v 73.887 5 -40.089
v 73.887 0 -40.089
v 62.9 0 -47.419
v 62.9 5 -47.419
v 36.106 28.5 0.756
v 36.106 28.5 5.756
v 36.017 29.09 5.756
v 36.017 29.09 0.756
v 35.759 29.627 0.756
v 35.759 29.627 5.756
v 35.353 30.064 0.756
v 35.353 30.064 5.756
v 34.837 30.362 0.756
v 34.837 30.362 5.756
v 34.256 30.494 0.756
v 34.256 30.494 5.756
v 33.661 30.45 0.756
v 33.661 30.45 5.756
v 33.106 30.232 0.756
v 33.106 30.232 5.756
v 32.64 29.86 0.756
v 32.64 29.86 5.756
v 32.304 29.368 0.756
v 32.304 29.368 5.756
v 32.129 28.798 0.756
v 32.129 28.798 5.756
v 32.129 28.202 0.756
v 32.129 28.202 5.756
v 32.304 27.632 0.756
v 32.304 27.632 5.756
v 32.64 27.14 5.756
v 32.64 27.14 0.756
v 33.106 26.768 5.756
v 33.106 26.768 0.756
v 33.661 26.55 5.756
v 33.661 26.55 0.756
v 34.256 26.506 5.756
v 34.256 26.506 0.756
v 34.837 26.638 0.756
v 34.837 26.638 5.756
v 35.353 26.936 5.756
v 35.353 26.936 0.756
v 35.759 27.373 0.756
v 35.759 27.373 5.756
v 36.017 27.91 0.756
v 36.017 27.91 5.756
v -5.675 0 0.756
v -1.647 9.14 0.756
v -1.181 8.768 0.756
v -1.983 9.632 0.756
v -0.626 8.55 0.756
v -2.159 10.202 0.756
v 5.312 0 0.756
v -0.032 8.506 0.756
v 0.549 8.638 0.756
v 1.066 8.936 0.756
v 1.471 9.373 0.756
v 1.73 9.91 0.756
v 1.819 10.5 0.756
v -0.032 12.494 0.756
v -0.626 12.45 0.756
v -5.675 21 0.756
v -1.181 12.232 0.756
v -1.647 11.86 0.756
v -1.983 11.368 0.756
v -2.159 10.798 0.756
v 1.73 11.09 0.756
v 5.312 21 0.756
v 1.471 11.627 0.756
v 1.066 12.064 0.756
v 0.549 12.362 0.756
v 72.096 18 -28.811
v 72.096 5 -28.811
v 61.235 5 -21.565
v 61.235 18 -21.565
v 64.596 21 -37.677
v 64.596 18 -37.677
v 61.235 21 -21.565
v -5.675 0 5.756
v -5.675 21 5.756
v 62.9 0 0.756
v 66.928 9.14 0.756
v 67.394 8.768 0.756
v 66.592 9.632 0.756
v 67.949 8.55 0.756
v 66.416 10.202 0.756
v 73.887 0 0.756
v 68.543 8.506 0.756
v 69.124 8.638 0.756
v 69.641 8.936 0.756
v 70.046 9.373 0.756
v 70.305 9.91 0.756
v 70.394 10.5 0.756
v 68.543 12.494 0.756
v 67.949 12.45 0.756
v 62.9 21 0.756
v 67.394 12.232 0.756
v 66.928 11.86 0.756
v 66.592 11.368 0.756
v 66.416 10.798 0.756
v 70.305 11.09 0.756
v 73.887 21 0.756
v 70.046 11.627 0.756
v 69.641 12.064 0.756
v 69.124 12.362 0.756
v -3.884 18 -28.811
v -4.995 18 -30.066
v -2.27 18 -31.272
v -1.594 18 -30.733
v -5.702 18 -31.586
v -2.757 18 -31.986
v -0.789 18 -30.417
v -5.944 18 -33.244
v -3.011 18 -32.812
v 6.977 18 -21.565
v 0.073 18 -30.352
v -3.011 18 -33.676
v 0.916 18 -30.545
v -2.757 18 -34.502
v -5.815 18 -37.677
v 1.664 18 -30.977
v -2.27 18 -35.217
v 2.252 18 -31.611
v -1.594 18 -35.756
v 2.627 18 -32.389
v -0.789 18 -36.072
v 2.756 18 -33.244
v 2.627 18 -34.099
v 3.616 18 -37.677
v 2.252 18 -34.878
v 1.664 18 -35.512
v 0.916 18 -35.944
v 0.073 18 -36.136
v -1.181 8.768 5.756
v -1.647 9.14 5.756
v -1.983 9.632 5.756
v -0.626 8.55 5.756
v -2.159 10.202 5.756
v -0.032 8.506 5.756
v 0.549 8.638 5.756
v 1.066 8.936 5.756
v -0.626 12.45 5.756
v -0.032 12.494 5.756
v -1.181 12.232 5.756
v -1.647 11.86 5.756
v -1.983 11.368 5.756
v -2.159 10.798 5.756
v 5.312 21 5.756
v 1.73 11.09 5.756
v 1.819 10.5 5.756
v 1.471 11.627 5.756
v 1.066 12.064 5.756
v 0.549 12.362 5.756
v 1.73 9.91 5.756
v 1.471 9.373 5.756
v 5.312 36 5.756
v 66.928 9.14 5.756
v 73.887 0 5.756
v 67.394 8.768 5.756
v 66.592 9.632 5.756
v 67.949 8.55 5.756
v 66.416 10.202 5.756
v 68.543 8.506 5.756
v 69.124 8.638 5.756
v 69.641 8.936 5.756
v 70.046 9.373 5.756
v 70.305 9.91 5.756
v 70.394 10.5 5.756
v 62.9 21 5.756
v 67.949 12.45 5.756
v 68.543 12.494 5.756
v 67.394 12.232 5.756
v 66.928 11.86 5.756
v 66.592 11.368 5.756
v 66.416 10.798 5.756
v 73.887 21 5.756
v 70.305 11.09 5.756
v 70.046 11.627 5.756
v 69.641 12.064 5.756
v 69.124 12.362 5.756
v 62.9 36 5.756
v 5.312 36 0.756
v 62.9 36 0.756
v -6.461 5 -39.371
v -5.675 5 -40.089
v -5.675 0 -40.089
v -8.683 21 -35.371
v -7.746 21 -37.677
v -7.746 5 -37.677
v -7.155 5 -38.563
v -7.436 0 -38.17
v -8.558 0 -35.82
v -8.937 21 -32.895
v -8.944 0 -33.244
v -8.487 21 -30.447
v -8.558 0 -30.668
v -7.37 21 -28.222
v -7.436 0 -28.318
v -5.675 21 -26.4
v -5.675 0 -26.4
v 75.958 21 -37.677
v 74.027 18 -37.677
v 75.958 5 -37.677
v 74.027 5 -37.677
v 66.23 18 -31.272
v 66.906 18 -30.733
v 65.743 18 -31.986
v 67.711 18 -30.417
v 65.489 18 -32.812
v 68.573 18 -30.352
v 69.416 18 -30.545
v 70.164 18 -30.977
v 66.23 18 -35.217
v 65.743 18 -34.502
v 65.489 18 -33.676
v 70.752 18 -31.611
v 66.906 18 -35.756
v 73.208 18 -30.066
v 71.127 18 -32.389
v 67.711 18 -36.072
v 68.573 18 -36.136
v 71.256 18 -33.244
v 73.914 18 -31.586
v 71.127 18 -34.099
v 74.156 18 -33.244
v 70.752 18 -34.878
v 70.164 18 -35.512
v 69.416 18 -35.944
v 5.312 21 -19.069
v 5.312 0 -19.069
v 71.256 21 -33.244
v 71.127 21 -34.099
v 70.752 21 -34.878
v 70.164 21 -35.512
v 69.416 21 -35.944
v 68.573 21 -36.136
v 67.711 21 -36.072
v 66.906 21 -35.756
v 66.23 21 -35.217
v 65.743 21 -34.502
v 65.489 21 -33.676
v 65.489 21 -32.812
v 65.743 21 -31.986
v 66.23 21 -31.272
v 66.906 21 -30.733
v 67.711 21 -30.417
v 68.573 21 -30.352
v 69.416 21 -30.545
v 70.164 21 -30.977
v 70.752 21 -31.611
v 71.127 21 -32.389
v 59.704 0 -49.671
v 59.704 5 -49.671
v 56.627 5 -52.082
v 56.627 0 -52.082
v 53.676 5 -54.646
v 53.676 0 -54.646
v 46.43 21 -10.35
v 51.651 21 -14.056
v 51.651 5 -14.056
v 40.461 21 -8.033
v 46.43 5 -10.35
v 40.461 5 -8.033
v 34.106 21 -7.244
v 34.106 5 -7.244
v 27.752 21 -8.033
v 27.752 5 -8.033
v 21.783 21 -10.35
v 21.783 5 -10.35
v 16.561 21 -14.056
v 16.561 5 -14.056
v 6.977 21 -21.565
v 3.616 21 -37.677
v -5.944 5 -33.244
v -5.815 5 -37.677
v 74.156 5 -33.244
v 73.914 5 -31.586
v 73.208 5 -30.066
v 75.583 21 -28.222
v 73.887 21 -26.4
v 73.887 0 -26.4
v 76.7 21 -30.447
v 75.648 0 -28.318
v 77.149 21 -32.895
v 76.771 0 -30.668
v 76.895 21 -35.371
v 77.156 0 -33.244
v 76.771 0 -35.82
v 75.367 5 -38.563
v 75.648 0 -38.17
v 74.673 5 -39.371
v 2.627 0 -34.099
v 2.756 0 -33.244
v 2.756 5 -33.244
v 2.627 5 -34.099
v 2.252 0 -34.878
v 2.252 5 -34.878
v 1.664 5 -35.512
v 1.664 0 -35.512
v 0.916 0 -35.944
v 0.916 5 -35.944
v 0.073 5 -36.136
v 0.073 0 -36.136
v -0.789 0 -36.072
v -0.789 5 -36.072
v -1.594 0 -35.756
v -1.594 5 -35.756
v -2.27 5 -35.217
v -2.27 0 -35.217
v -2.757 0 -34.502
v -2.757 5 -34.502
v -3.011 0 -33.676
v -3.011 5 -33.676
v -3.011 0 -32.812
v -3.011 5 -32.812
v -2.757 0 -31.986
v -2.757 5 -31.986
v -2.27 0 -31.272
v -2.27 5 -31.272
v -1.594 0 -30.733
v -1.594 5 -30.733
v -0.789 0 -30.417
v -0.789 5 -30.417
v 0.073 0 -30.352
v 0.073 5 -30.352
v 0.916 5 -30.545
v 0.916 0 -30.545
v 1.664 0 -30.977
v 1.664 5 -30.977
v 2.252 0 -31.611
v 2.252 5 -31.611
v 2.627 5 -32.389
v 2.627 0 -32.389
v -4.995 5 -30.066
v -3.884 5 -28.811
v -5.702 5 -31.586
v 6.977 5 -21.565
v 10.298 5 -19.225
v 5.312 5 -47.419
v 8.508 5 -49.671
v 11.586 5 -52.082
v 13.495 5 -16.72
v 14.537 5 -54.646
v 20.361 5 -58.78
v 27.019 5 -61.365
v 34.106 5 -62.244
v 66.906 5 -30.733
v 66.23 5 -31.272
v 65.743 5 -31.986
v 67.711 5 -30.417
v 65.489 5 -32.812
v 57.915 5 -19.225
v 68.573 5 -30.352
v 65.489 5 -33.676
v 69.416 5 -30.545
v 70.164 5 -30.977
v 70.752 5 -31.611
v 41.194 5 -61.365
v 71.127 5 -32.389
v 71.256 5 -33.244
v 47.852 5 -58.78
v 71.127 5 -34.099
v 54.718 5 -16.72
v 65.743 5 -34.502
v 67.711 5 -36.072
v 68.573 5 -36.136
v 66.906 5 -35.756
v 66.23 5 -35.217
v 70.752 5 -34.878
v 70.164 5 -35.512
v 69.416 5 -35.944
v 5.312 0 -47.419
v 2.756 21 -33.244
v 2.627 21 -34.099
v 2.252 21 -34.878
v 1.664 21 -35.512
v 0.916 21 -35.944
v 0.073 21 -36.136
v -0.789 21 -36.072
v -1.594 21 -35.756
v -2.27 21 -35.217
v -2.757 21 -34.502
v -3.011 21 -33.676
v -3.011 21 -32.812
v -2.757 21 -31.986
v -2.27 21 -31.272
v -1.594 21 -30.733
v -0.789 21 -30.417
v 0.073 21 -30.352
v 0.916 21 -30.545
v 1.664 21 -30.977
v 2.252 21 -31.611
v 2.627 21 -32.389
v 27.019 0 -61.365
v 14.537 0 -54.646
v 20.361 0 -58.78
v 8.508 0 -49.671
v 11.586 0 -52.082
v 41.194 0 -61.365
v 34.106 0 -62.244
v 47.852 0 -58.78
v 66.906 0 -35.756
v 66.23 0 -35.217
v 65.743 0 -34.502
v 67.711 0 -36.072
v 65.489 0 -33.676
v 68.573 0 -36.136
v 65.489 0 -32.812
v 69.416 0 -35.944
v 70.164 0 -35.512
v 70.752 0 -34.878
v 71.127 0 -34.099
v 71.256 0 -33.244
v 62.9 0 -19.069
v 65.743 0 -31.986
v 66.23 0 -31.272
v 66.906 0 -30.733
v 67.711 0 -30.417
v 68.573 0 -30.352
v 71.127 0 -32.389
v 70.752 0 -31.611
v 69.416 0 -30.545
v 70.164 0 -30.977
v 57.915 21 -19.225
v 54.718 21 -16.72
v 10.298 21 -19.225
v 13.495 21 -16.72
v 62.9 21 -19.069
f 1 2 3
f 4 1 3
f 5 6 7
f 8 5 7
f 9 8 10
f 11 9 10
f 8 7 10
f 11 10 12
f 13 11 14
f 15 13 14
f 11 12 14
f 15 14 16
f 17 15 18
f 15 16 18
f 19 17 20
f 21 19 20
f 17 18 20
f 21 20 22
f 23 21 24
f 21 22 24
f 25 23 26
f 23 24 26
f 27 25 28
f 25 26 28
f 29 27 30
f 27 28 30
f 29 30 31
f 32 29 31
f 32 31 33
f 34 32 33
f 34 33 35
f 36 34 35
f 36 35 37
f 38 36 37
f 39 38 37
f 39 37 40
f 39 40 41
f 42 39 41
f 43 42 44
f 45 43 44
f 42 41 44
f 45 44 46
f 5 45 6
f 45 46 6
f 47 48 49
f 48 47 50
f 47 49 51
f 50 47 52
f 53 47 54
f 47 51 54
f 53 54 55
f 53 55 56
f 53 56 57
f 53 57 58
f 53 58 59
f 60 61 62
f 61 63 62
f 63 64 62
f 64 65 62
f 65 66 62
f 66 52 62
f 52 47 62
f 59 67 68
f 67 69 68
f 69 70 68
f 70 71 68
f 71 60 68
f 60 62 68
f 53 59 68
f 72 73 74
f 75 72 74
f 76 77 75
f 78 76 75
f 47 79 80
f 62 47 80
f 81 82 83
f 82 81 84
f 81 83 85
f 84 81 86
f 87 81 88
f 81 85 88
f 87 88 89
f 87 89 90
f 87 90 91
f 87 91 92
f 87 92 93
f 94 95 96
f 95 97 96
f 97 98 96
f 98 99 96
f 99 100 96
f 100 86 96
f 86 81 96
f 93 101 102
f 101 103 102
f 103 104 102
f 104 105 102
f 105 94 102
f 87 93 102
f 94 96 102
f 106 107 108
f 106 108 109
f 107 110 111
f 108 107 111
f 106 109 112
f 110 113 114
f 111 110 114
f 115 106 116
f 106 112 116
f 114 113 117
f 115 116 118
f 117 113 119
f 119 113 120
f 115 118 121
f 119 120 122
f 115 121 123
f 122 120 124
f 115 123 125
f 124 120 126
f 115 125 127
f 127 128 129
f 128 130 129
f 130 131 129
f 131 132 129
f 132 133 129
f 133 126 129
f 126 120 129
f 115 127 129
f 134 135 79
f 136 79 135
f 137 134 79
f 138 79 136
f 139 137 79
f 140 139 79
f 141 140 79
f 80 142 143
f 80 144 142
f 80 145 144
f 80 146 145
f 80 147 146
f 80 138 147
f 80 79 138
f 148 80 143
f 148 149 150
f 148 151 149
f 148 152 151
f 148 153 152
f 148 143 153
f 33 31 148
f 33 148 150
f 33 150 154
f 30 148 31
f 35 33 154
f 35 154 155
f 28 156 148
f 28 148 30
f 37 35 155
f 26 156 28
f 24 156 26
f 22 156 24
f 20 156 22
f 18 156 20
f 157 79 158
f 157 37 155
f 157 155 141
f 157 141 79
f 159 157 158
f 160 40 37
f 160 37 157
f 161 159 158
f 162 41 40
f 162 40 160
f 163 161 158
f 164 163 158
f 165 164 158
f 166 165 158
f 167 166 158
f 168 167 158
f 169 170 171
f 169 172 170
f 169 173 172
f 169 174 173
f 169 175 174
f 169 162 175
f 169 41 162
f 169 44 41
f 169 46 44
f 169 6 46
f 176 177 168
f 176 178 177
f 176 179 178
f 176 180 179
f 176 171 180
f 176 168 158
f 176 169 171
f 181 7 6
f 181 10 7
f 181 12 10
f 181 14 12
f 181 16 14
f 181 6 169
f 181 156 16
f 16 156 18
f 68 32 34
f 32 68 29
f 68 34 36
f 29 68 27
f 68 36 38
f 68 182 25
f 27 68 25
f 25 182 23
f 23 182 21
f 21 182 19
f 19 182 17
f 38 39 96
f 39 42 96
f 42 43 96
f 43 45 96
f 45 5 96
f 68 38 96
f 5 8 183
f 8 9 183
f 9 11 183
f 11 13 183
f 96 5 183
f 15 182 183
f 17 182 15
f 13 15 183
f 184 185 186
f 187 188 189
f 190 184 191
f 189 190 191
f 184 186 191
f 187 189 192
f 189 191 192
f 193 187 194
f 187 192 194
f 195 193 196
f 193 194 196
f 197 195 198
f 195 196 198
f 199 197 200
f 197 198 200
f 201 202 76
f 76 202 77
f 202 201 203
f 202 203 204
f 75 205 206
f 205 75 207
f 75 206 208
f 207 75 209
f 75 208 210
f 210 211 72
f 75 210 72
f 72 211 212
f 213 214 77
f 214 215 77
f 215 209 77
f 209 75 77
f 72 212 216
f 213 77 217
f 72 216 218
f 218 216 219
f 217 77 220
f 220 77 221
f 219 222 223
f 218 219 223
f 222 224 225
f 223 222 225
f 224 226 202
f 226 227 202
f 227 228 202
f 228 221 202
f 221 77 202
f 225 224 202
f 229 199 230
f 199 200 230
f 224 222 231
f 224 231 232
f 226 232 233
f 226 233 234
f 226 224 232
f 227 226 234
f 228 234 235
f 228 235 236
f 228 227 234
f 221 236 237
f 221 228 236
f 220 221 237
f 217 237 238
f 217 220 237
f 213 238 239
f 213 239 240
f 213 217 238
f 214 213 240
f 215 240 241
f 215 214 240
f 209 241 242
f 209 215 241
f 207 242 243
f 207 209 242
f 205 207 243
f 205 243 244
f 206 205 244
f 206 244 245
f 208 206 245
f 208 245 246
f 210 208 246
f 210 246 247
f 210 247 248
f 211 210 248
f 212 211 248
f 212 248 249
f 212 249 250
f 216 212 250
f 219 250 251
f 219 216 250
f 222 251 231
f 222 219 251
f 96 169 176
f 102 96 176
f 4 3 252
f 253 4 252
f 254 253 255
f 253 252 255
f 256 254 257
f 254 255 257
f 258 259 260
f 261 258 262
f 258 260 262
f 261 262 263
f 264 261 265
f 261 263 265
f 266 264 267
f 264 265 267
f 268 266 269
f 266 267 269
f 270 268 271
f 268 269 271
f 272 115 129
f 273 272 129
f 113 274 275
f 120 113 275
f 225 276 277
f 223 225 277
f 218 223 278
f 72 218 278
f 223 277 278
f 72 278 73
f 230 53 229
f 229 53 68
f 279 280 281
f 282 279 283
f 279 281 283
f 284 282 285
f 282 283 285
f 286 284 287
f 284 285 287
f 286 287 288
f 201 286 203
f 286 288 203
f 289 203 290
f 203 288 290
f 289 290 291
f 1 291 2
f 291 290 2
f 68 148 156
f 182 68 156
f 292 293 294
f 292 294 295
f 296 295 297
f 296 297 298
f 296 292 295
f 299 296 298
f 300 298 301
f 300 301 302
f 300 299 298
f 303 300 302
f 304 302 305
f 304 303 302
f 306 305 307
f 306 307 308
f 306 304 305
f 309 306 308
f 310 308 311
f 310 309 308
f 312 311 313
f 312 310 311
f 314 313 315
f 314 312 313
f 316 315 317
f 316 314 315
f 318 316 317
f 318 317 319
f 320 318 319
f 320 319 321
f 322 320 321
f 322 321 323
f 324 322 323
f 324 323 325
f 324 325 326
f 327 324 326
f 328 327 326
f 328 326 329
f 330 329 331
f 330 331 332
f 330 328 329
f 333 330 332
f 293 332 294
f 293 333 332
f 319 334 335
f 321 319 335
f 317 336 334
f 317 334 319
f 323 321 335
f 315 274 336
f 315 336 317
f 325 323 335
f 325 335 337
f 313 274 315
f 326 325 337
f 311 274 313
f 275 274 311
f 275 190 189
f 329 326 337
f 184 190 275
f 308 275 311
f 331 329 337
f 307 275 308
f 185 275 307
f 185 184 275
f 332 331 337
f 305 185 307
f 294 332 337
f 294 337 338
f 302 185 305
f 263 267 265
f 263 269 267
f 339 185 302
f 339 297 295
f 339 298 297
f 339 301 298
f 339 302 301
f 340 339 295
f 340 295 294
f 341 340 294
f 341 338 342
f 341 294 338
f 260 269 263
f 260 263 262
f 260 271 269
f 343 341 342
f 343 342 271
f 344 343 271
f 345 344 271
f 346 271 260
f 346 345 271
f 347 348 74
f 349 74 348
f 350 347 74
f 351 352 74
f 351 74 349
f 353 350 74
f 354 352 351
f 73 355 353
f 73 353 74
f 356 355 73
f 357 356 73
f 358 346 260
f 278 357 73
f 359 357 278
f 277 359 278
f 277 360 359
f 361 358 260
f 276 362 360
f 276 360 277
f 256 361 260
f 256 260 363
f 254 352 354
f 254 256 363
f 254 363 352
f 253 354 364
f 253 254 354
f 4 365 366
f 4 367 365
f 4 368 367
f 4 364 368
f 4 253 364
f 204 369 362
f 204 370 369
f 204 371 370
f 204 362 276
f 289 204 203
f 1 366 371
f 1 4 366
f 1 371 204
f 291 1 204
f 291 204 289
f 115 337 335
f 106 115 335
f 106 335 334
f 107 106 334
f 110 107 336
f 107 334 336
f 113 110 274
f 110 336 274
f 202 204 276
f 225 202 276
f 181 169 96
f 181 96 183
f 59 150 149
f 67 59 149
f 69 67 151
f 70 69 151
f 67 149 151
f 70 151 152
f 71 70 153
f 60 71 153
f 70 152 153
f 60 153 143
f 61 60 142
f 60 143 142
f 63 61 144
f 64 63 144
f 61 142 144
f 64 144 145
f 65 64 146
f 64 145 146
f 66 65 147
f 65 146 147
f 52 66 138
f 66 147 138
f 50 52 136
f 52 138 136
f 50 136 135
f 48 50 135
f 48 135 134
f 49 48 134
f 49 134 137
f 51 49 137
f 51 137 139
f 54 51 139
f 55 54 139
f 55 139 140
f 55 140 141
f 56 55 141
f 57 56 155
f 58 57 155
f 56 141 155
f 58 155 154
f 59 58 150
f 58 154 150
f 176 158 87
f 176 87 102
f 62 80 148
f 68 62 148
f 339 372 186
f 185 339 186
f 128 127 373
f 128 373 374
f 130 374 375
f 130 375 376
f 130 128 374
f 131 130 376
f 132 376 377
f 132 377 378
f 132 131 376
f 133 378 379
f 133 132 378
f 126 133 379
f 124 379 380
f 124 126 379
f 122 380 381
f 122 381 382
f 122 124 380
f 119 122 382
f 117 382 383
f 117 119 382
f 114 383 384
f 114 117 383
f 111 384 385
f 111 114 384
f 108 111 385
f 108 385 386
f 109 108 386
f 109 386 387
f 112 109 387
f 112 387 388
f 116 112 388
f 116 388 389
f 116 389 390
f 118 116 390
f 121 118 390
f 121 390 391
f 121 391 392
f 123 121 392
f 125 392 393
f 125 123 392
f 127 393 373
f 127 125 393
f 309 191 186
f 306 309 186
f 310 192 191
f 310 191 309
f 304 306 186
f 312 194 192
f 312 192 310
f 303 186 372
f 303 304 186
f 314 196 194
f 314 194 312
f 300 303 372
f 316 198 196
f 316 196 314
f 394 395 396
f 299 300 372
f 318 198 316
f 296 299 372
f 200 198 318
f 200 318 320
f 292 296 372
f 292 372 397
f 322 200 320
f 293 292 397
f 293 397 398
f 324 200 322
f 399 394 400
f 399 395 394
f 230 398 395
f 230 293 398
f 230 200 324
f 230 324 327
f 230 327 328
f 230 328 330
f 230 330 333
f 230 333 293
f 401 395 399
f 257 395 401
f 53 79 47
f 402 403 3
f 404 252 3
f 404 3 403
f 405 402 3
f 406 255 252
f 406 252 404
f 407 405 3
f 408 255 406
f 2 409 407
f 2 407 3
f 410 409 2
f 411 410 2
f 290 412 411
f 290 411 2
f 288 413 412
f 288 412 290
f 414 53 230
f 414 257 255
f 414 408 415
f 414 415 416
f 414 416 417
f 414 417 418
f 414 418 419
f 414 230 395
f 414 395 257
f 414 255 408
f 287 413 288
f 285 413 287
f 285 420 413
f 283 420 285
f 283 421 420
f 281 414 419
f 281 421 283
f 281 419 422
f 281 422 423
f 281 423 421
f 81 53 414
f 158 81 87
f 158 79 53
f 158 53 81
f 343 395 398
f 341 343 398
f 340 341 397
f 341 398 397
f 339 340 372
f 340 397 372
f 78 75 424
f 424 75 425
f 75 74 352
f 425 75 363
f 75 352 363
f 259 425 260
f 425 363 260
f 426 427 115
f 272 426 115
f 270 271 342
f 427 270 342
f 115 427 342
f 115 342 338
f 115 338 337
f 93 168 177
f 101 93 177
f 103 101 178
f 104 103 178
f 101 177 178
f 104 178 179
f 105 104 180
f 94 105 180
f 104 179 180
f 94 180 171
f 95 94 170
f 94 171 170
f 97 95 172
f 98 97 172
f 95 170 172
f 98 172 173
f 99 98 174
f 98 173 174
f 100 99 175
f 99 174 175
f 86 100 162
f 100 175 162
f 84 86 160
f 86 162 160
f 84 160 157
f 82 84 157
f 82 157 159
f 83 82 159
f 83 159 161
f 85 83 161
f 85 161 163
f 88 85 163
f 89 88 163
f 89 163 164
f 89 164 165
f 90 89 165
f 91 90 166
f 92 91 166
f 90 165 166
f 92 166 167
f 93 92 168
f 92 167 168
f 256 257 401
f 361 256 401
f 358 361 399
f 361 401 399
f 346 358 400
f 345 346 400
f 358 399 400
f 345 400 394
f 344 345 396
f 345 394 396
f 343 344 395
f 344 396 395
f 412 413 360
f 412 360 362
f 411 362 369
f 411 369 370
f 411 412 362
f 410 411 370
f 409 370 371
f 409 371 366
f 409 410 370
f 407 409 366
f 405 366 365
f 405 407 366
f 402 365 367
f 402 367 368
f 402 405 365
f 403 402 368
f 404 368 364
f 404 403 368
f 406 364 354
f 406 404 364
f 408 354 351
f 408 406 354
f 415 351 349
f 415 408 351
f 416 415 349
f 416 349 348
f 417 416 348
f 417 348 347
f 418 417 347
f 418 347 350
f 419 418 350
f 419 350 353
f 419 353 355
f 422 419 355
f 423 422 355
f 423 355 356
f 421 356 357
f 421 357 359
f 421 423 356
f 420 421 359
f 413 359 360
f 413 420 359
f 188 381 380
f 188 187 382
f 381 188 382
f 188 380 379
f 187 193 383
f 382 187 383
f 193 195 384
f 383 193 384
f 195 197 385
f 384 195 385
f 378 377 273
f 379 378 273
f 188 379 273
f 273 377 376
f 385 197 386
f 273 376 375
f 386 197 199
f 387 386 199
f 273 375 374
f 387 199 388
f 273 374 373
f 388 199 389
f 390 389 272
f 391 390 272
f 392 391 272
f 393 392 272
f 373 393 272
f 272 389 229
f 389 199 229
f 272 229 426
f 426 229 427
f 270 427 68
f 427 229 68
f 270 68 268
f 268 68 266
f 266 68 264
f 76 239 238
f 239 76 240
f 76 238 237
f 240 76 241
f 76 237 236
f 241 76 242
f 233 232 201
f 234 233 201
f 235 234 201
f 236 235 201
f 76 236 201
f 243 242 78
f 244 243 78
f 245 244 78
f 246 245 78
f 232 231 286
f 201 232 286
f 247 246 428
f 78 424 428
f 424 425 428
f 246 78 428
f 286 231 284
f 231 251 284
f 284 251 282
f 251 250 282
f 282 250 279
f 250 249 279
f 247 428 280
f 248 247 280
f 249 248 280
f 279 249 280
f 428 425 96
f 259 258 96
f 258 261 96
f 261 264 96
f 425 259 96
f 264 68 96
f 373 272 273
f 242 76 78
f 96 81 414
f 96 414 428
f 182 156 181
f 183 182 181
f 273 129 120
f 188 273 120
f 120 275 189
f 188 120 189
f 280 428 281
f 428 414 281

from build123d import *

# Parameters (mm, degrees)
SKETCH1_R           = 2.9
BOSS_EXTRUDE1_DEPTH = 5
BOSS_EXTRUDE2_DEPTH = 13
SKETCH4_R           = 2.9
BOSS_EXTRUDE3_DEPTH = 3
BOSS_EXTRUDE4_DEPTH = 21
SKETCH7_W           = 57.588234794
SKETCH7_H           = 15
SKETCH7_R           = 2
BOSS_EXTRUDE6_DEPTH = 5
SKETCH9_W           = 10.98683059
SKETCH9_H           = 21
SKETCH9_R           = 2
BOSS_EXTRUDE7_DEPTH = 5


with BuildPart() as part:
    # Sketch1 → Boss-Extrude1 (new body)
    with BuildSketch(Plane(origin=(0, 0, 0), x_dir=(1, 0, 0), z_dir=(0, 1, 0))):
        with BuildLine():
            Line((62.90038715, 19.069123632), (73.88721774, 26.399609553))
            ThreePointArc((73.88721774, 26.399609553), (77.156269753, 33.244214317), (73.88721774, 40.088819081))
            Line((73.88721774, 40.088819081), (62.90038715, 47.419305002))
            ThreePointArc((62.90038715, 47.419305002), (58.150415973, 50.856886947), (53.675790472, 54.645939921))
            ThreePointArc((53.675790472, 54.645939921), (34.106269753, 62.244214317), (14.536749034, 54.645939921))
            ThreePointArc((14.536749034, 54.645939921), (10.062123533, 50.856886947), (5.312152356, 47.419305002))
            Line((5.312152356, 47.419305002), (-5.674678234, 40.088819081))
            ThreePointArc((-5.674678234, 40.088819081), (-8.943730247, 33.244214317), (-5.674678234, 26.399609553))
            Line((-5.674678234, 26.399609553), (5.312152356, 19.069123632))
            ThreePointArc((5.312152356, 19.069123632), (10.062123533, 15.631541687), (14.536749034, 11.842488713))
            ThreePointArc((14.536749034, 11.842488713), (34.106269753, 4.244214317), (53.675790472, 11.842488713))
            ThreePointArc((53.675790472, 11.842488713), (58.150415973, 15.631541687), (62.90038715, 19.069123632))
        make_face()
        with Locations((68.356269753, 33.244214317)):
            Circle(SKETCH1_R, mode=Mode.SUBTRACT)
        with Locations((-0.143730247, 33.244214317)):
            Circle(SKETCH1_R, mode=Mode.SUBTRACT)
    extrude(amount=BOSS_EXTRUDE1_DEPTH)

    # Sketch3 → Boss-Extrude2 (add)
    with BuildSketch(Plane(origin=(0, 5, 0), x_dir=(1, 0, 0), z_dir=(0, 1, 0))):
        with BuildLine():
            Line((62.90038715, 19.069123632), (73.88721774, 26.399609553))
            ThreePointArc((73.88721774, 26.399609553), (77.011551697, 31.654845113), (75.9581291, 37.677242003))
            Line((75.9581291, 37.677242003), (74.027243913, 37.677242003))
            Line((74.027243913, 37.677242003), (74.156269753, 33.244214317))
            ThreePointArc((74.156269753, 33.244214317), (73.616142187, 30.800090348), (72.096358727, 28.811186631))
            Line((72.096358727, 28.811186631), (61.235353843, 21.564652451))
            ThreePointArc((61.235353843, 21.564652451), (56.300318854, 17.993138742), (51.651357294, 14.056460327))
            ThreePointArc((51.651357294, 14.056460327), (34.106269753, 7.244214317), (16.561182212, 14.056460327))
            ThreePointArc((16.561182212, 14.056460327), (11.912220652, 17.993138742), (6.977185663, 21.564652451))
            Line((6.977185663, 21.564652451), (-3.883819221, 28.811186631))
            ThreePointArc((-3.883819221, 28.811186631), (-5.403602681, 30.800090348), (-5.943730247, 33.244214317))
            Line((-5.943730247, 33.244214317), (-5.814704408, 37.677242003))
            Line((-5.814704408, 37.677242003), (-7.745589594, 37.677242003))
            ThreePointArc((-7.745589594, 37.677242003), (-8.799012191, 31.654845113), (-5.674678234, 26.399609553))
            Line((-5.674678234, 26.399609553), (5.312152356, 19.069123632))
            ThreePointArc((5.312152356, 19.069123632), (10.062123533, 15.631541687), (14.536749034, 11.842488713))
            ThreePointArc((14.536749034, 11.842488713), (34.106269753, 4.244214317), (53.675790472, 11.842488713))
            ThreePointArc((53.675790472, 11.842488713), (58.150415973, 15.631541687), (62.90038715, 19.069123632))
        make_face()
    extrude(amount=BOSS_EXTRUDE2_DEPTH)

    # Sketch4 → Boss-Extrude3 (add)
    with BuildSketch(Plane(origin=(0, 18, 0), x_dir=(1, 0, 0), z_dir=(0, 1, 0))):
        with BuildLine():
            Line((3.616180779, 37.677242003), (-7.745589594, 37.677242003))
            ThreePointArc((-7.745589594, 37.677242003), (-8.799012191, 31.654845113), (-5.674678234, 26.399609553))
            Line((-5.674678234, 26.399609553), (5.312152356, 19.069123632))
            ThreePointArc((5.312152356, 19.069123632), (10.062123533, 15.631541687), (14.536749034, 11.842488713))
            ThreePointArc((14.536749034, 11.842488713), (34.106269753, 4.244214317), (53.675790472, 11.842488713))
            ThreePointArc((53.675790472, 11.842488713), (58.150415973, 15.631541687), (62.90038715, 19.069123632))
            Line((62.90038715, 19.069123632), (73.88721774, 26.399609553))
            ThreePointArc((73.88721774, 26.399609553), (77.011551697, 31.654845113), (75.9581291, 37.677242003))
            Line((75.9581291, 37.677242003), (64.596358727, 37.677242003))
            Line((64.596358727, 37.677242003), (61.235353843, 21.564652451))
            ThreePointArc((61.235353843, 21.564652451), (56.300318854, 17.993138742), (51.651357294, 14.056460327))
            ThreePointArc((51.651357294, 14.056460327), (34.106269753, 7.244214317), (16.561182212, 14.056460327))
            ThreePointArc((16.561182212, 14.056460327), (11.912220652, 17.993138742), (6.977185663, 21.564652451))
            Line((6.977185663, 21.564652451), (3.616180779, 37.677242003))
        make_face()
        with Locations((-0.143730247, 33.244214317)):
            Circle(SKETCH4_R, mode=Mode.SUBTRACT)
        with Locations((68.356269753, 33.244214317)):
            Circle(SKETCH4_R, mode=Mode.SUBTRACT)
    extrude(amount=BOSS_EXTRUDE3_DEPTH)

    # Sketch5 → Boss-Extrude4 (add)
    with BuildSketch(Plane.XZ):
        with BuildLine():
            Line((62.90038715, -19.069123632), (62.90038715, 5.755785683))
            Line((62.90038715, 5.755785683), (5.312152356, 5.755785683))
            Line((5.312152356, 5.755785683), (5.312152356, -19.069123632))
            ThreePointArc((5.312152356, -19.069123632), (10.062123533, -15.631541687), (14.536749034, -11.842488713))
            ThreePointArc((14.536749034, -11.842488713), (34.106269753, -4.244214317), (53.675790472, -11.842488713))
            ThreePointArc((53.675790472, -11.842488713), (58.150415973, -15.631541687), (62.90038715, -19.069123632))
        make_face()
    extrude(amount=-BOSS_EXTRUDE4_DEPTH)

    # Sketch7 → Boss-Extrude6 (add)
    with BuildSketch(Plane.XY.offset(5.755785683)):
        with Locations((34.106269753, 28.5)):
            Rectangle(SKETCH7_W, SKETCH7_H)
        with Locations((34.106269753, 28.5)):
            Circle(SKETCH7_R, mode=Mode.SUBTRACT)
    extrude(amount=-BOSS_EXTRUDE6_DEPTH)

    # Sketch9 → Boss-Extrude7 (add)
    with BuildSketch(Plane.XY.offset(5.755785683)):
        with Locations((68.393802445, 10.5)):
            Rectangle(SKETCH9_W, SKETCH9_H)
        with Locations((68.393802445, 10.5)):
            Circle(SKETCH9_R, mode=Mode.SUBTRACT)
        with Locations((-0.181262939, 10.5)):
            Rectangle(SKETCH9_W, SKETCH9_H)
        with Locations((-0.181262939, 10.5)):
            Circle(SKETCH9_R, mode=Mode.SUBTRACT)
    extrude(amount=-BOSS_EXTRUDE7_DEPTH)


solid = part.part
